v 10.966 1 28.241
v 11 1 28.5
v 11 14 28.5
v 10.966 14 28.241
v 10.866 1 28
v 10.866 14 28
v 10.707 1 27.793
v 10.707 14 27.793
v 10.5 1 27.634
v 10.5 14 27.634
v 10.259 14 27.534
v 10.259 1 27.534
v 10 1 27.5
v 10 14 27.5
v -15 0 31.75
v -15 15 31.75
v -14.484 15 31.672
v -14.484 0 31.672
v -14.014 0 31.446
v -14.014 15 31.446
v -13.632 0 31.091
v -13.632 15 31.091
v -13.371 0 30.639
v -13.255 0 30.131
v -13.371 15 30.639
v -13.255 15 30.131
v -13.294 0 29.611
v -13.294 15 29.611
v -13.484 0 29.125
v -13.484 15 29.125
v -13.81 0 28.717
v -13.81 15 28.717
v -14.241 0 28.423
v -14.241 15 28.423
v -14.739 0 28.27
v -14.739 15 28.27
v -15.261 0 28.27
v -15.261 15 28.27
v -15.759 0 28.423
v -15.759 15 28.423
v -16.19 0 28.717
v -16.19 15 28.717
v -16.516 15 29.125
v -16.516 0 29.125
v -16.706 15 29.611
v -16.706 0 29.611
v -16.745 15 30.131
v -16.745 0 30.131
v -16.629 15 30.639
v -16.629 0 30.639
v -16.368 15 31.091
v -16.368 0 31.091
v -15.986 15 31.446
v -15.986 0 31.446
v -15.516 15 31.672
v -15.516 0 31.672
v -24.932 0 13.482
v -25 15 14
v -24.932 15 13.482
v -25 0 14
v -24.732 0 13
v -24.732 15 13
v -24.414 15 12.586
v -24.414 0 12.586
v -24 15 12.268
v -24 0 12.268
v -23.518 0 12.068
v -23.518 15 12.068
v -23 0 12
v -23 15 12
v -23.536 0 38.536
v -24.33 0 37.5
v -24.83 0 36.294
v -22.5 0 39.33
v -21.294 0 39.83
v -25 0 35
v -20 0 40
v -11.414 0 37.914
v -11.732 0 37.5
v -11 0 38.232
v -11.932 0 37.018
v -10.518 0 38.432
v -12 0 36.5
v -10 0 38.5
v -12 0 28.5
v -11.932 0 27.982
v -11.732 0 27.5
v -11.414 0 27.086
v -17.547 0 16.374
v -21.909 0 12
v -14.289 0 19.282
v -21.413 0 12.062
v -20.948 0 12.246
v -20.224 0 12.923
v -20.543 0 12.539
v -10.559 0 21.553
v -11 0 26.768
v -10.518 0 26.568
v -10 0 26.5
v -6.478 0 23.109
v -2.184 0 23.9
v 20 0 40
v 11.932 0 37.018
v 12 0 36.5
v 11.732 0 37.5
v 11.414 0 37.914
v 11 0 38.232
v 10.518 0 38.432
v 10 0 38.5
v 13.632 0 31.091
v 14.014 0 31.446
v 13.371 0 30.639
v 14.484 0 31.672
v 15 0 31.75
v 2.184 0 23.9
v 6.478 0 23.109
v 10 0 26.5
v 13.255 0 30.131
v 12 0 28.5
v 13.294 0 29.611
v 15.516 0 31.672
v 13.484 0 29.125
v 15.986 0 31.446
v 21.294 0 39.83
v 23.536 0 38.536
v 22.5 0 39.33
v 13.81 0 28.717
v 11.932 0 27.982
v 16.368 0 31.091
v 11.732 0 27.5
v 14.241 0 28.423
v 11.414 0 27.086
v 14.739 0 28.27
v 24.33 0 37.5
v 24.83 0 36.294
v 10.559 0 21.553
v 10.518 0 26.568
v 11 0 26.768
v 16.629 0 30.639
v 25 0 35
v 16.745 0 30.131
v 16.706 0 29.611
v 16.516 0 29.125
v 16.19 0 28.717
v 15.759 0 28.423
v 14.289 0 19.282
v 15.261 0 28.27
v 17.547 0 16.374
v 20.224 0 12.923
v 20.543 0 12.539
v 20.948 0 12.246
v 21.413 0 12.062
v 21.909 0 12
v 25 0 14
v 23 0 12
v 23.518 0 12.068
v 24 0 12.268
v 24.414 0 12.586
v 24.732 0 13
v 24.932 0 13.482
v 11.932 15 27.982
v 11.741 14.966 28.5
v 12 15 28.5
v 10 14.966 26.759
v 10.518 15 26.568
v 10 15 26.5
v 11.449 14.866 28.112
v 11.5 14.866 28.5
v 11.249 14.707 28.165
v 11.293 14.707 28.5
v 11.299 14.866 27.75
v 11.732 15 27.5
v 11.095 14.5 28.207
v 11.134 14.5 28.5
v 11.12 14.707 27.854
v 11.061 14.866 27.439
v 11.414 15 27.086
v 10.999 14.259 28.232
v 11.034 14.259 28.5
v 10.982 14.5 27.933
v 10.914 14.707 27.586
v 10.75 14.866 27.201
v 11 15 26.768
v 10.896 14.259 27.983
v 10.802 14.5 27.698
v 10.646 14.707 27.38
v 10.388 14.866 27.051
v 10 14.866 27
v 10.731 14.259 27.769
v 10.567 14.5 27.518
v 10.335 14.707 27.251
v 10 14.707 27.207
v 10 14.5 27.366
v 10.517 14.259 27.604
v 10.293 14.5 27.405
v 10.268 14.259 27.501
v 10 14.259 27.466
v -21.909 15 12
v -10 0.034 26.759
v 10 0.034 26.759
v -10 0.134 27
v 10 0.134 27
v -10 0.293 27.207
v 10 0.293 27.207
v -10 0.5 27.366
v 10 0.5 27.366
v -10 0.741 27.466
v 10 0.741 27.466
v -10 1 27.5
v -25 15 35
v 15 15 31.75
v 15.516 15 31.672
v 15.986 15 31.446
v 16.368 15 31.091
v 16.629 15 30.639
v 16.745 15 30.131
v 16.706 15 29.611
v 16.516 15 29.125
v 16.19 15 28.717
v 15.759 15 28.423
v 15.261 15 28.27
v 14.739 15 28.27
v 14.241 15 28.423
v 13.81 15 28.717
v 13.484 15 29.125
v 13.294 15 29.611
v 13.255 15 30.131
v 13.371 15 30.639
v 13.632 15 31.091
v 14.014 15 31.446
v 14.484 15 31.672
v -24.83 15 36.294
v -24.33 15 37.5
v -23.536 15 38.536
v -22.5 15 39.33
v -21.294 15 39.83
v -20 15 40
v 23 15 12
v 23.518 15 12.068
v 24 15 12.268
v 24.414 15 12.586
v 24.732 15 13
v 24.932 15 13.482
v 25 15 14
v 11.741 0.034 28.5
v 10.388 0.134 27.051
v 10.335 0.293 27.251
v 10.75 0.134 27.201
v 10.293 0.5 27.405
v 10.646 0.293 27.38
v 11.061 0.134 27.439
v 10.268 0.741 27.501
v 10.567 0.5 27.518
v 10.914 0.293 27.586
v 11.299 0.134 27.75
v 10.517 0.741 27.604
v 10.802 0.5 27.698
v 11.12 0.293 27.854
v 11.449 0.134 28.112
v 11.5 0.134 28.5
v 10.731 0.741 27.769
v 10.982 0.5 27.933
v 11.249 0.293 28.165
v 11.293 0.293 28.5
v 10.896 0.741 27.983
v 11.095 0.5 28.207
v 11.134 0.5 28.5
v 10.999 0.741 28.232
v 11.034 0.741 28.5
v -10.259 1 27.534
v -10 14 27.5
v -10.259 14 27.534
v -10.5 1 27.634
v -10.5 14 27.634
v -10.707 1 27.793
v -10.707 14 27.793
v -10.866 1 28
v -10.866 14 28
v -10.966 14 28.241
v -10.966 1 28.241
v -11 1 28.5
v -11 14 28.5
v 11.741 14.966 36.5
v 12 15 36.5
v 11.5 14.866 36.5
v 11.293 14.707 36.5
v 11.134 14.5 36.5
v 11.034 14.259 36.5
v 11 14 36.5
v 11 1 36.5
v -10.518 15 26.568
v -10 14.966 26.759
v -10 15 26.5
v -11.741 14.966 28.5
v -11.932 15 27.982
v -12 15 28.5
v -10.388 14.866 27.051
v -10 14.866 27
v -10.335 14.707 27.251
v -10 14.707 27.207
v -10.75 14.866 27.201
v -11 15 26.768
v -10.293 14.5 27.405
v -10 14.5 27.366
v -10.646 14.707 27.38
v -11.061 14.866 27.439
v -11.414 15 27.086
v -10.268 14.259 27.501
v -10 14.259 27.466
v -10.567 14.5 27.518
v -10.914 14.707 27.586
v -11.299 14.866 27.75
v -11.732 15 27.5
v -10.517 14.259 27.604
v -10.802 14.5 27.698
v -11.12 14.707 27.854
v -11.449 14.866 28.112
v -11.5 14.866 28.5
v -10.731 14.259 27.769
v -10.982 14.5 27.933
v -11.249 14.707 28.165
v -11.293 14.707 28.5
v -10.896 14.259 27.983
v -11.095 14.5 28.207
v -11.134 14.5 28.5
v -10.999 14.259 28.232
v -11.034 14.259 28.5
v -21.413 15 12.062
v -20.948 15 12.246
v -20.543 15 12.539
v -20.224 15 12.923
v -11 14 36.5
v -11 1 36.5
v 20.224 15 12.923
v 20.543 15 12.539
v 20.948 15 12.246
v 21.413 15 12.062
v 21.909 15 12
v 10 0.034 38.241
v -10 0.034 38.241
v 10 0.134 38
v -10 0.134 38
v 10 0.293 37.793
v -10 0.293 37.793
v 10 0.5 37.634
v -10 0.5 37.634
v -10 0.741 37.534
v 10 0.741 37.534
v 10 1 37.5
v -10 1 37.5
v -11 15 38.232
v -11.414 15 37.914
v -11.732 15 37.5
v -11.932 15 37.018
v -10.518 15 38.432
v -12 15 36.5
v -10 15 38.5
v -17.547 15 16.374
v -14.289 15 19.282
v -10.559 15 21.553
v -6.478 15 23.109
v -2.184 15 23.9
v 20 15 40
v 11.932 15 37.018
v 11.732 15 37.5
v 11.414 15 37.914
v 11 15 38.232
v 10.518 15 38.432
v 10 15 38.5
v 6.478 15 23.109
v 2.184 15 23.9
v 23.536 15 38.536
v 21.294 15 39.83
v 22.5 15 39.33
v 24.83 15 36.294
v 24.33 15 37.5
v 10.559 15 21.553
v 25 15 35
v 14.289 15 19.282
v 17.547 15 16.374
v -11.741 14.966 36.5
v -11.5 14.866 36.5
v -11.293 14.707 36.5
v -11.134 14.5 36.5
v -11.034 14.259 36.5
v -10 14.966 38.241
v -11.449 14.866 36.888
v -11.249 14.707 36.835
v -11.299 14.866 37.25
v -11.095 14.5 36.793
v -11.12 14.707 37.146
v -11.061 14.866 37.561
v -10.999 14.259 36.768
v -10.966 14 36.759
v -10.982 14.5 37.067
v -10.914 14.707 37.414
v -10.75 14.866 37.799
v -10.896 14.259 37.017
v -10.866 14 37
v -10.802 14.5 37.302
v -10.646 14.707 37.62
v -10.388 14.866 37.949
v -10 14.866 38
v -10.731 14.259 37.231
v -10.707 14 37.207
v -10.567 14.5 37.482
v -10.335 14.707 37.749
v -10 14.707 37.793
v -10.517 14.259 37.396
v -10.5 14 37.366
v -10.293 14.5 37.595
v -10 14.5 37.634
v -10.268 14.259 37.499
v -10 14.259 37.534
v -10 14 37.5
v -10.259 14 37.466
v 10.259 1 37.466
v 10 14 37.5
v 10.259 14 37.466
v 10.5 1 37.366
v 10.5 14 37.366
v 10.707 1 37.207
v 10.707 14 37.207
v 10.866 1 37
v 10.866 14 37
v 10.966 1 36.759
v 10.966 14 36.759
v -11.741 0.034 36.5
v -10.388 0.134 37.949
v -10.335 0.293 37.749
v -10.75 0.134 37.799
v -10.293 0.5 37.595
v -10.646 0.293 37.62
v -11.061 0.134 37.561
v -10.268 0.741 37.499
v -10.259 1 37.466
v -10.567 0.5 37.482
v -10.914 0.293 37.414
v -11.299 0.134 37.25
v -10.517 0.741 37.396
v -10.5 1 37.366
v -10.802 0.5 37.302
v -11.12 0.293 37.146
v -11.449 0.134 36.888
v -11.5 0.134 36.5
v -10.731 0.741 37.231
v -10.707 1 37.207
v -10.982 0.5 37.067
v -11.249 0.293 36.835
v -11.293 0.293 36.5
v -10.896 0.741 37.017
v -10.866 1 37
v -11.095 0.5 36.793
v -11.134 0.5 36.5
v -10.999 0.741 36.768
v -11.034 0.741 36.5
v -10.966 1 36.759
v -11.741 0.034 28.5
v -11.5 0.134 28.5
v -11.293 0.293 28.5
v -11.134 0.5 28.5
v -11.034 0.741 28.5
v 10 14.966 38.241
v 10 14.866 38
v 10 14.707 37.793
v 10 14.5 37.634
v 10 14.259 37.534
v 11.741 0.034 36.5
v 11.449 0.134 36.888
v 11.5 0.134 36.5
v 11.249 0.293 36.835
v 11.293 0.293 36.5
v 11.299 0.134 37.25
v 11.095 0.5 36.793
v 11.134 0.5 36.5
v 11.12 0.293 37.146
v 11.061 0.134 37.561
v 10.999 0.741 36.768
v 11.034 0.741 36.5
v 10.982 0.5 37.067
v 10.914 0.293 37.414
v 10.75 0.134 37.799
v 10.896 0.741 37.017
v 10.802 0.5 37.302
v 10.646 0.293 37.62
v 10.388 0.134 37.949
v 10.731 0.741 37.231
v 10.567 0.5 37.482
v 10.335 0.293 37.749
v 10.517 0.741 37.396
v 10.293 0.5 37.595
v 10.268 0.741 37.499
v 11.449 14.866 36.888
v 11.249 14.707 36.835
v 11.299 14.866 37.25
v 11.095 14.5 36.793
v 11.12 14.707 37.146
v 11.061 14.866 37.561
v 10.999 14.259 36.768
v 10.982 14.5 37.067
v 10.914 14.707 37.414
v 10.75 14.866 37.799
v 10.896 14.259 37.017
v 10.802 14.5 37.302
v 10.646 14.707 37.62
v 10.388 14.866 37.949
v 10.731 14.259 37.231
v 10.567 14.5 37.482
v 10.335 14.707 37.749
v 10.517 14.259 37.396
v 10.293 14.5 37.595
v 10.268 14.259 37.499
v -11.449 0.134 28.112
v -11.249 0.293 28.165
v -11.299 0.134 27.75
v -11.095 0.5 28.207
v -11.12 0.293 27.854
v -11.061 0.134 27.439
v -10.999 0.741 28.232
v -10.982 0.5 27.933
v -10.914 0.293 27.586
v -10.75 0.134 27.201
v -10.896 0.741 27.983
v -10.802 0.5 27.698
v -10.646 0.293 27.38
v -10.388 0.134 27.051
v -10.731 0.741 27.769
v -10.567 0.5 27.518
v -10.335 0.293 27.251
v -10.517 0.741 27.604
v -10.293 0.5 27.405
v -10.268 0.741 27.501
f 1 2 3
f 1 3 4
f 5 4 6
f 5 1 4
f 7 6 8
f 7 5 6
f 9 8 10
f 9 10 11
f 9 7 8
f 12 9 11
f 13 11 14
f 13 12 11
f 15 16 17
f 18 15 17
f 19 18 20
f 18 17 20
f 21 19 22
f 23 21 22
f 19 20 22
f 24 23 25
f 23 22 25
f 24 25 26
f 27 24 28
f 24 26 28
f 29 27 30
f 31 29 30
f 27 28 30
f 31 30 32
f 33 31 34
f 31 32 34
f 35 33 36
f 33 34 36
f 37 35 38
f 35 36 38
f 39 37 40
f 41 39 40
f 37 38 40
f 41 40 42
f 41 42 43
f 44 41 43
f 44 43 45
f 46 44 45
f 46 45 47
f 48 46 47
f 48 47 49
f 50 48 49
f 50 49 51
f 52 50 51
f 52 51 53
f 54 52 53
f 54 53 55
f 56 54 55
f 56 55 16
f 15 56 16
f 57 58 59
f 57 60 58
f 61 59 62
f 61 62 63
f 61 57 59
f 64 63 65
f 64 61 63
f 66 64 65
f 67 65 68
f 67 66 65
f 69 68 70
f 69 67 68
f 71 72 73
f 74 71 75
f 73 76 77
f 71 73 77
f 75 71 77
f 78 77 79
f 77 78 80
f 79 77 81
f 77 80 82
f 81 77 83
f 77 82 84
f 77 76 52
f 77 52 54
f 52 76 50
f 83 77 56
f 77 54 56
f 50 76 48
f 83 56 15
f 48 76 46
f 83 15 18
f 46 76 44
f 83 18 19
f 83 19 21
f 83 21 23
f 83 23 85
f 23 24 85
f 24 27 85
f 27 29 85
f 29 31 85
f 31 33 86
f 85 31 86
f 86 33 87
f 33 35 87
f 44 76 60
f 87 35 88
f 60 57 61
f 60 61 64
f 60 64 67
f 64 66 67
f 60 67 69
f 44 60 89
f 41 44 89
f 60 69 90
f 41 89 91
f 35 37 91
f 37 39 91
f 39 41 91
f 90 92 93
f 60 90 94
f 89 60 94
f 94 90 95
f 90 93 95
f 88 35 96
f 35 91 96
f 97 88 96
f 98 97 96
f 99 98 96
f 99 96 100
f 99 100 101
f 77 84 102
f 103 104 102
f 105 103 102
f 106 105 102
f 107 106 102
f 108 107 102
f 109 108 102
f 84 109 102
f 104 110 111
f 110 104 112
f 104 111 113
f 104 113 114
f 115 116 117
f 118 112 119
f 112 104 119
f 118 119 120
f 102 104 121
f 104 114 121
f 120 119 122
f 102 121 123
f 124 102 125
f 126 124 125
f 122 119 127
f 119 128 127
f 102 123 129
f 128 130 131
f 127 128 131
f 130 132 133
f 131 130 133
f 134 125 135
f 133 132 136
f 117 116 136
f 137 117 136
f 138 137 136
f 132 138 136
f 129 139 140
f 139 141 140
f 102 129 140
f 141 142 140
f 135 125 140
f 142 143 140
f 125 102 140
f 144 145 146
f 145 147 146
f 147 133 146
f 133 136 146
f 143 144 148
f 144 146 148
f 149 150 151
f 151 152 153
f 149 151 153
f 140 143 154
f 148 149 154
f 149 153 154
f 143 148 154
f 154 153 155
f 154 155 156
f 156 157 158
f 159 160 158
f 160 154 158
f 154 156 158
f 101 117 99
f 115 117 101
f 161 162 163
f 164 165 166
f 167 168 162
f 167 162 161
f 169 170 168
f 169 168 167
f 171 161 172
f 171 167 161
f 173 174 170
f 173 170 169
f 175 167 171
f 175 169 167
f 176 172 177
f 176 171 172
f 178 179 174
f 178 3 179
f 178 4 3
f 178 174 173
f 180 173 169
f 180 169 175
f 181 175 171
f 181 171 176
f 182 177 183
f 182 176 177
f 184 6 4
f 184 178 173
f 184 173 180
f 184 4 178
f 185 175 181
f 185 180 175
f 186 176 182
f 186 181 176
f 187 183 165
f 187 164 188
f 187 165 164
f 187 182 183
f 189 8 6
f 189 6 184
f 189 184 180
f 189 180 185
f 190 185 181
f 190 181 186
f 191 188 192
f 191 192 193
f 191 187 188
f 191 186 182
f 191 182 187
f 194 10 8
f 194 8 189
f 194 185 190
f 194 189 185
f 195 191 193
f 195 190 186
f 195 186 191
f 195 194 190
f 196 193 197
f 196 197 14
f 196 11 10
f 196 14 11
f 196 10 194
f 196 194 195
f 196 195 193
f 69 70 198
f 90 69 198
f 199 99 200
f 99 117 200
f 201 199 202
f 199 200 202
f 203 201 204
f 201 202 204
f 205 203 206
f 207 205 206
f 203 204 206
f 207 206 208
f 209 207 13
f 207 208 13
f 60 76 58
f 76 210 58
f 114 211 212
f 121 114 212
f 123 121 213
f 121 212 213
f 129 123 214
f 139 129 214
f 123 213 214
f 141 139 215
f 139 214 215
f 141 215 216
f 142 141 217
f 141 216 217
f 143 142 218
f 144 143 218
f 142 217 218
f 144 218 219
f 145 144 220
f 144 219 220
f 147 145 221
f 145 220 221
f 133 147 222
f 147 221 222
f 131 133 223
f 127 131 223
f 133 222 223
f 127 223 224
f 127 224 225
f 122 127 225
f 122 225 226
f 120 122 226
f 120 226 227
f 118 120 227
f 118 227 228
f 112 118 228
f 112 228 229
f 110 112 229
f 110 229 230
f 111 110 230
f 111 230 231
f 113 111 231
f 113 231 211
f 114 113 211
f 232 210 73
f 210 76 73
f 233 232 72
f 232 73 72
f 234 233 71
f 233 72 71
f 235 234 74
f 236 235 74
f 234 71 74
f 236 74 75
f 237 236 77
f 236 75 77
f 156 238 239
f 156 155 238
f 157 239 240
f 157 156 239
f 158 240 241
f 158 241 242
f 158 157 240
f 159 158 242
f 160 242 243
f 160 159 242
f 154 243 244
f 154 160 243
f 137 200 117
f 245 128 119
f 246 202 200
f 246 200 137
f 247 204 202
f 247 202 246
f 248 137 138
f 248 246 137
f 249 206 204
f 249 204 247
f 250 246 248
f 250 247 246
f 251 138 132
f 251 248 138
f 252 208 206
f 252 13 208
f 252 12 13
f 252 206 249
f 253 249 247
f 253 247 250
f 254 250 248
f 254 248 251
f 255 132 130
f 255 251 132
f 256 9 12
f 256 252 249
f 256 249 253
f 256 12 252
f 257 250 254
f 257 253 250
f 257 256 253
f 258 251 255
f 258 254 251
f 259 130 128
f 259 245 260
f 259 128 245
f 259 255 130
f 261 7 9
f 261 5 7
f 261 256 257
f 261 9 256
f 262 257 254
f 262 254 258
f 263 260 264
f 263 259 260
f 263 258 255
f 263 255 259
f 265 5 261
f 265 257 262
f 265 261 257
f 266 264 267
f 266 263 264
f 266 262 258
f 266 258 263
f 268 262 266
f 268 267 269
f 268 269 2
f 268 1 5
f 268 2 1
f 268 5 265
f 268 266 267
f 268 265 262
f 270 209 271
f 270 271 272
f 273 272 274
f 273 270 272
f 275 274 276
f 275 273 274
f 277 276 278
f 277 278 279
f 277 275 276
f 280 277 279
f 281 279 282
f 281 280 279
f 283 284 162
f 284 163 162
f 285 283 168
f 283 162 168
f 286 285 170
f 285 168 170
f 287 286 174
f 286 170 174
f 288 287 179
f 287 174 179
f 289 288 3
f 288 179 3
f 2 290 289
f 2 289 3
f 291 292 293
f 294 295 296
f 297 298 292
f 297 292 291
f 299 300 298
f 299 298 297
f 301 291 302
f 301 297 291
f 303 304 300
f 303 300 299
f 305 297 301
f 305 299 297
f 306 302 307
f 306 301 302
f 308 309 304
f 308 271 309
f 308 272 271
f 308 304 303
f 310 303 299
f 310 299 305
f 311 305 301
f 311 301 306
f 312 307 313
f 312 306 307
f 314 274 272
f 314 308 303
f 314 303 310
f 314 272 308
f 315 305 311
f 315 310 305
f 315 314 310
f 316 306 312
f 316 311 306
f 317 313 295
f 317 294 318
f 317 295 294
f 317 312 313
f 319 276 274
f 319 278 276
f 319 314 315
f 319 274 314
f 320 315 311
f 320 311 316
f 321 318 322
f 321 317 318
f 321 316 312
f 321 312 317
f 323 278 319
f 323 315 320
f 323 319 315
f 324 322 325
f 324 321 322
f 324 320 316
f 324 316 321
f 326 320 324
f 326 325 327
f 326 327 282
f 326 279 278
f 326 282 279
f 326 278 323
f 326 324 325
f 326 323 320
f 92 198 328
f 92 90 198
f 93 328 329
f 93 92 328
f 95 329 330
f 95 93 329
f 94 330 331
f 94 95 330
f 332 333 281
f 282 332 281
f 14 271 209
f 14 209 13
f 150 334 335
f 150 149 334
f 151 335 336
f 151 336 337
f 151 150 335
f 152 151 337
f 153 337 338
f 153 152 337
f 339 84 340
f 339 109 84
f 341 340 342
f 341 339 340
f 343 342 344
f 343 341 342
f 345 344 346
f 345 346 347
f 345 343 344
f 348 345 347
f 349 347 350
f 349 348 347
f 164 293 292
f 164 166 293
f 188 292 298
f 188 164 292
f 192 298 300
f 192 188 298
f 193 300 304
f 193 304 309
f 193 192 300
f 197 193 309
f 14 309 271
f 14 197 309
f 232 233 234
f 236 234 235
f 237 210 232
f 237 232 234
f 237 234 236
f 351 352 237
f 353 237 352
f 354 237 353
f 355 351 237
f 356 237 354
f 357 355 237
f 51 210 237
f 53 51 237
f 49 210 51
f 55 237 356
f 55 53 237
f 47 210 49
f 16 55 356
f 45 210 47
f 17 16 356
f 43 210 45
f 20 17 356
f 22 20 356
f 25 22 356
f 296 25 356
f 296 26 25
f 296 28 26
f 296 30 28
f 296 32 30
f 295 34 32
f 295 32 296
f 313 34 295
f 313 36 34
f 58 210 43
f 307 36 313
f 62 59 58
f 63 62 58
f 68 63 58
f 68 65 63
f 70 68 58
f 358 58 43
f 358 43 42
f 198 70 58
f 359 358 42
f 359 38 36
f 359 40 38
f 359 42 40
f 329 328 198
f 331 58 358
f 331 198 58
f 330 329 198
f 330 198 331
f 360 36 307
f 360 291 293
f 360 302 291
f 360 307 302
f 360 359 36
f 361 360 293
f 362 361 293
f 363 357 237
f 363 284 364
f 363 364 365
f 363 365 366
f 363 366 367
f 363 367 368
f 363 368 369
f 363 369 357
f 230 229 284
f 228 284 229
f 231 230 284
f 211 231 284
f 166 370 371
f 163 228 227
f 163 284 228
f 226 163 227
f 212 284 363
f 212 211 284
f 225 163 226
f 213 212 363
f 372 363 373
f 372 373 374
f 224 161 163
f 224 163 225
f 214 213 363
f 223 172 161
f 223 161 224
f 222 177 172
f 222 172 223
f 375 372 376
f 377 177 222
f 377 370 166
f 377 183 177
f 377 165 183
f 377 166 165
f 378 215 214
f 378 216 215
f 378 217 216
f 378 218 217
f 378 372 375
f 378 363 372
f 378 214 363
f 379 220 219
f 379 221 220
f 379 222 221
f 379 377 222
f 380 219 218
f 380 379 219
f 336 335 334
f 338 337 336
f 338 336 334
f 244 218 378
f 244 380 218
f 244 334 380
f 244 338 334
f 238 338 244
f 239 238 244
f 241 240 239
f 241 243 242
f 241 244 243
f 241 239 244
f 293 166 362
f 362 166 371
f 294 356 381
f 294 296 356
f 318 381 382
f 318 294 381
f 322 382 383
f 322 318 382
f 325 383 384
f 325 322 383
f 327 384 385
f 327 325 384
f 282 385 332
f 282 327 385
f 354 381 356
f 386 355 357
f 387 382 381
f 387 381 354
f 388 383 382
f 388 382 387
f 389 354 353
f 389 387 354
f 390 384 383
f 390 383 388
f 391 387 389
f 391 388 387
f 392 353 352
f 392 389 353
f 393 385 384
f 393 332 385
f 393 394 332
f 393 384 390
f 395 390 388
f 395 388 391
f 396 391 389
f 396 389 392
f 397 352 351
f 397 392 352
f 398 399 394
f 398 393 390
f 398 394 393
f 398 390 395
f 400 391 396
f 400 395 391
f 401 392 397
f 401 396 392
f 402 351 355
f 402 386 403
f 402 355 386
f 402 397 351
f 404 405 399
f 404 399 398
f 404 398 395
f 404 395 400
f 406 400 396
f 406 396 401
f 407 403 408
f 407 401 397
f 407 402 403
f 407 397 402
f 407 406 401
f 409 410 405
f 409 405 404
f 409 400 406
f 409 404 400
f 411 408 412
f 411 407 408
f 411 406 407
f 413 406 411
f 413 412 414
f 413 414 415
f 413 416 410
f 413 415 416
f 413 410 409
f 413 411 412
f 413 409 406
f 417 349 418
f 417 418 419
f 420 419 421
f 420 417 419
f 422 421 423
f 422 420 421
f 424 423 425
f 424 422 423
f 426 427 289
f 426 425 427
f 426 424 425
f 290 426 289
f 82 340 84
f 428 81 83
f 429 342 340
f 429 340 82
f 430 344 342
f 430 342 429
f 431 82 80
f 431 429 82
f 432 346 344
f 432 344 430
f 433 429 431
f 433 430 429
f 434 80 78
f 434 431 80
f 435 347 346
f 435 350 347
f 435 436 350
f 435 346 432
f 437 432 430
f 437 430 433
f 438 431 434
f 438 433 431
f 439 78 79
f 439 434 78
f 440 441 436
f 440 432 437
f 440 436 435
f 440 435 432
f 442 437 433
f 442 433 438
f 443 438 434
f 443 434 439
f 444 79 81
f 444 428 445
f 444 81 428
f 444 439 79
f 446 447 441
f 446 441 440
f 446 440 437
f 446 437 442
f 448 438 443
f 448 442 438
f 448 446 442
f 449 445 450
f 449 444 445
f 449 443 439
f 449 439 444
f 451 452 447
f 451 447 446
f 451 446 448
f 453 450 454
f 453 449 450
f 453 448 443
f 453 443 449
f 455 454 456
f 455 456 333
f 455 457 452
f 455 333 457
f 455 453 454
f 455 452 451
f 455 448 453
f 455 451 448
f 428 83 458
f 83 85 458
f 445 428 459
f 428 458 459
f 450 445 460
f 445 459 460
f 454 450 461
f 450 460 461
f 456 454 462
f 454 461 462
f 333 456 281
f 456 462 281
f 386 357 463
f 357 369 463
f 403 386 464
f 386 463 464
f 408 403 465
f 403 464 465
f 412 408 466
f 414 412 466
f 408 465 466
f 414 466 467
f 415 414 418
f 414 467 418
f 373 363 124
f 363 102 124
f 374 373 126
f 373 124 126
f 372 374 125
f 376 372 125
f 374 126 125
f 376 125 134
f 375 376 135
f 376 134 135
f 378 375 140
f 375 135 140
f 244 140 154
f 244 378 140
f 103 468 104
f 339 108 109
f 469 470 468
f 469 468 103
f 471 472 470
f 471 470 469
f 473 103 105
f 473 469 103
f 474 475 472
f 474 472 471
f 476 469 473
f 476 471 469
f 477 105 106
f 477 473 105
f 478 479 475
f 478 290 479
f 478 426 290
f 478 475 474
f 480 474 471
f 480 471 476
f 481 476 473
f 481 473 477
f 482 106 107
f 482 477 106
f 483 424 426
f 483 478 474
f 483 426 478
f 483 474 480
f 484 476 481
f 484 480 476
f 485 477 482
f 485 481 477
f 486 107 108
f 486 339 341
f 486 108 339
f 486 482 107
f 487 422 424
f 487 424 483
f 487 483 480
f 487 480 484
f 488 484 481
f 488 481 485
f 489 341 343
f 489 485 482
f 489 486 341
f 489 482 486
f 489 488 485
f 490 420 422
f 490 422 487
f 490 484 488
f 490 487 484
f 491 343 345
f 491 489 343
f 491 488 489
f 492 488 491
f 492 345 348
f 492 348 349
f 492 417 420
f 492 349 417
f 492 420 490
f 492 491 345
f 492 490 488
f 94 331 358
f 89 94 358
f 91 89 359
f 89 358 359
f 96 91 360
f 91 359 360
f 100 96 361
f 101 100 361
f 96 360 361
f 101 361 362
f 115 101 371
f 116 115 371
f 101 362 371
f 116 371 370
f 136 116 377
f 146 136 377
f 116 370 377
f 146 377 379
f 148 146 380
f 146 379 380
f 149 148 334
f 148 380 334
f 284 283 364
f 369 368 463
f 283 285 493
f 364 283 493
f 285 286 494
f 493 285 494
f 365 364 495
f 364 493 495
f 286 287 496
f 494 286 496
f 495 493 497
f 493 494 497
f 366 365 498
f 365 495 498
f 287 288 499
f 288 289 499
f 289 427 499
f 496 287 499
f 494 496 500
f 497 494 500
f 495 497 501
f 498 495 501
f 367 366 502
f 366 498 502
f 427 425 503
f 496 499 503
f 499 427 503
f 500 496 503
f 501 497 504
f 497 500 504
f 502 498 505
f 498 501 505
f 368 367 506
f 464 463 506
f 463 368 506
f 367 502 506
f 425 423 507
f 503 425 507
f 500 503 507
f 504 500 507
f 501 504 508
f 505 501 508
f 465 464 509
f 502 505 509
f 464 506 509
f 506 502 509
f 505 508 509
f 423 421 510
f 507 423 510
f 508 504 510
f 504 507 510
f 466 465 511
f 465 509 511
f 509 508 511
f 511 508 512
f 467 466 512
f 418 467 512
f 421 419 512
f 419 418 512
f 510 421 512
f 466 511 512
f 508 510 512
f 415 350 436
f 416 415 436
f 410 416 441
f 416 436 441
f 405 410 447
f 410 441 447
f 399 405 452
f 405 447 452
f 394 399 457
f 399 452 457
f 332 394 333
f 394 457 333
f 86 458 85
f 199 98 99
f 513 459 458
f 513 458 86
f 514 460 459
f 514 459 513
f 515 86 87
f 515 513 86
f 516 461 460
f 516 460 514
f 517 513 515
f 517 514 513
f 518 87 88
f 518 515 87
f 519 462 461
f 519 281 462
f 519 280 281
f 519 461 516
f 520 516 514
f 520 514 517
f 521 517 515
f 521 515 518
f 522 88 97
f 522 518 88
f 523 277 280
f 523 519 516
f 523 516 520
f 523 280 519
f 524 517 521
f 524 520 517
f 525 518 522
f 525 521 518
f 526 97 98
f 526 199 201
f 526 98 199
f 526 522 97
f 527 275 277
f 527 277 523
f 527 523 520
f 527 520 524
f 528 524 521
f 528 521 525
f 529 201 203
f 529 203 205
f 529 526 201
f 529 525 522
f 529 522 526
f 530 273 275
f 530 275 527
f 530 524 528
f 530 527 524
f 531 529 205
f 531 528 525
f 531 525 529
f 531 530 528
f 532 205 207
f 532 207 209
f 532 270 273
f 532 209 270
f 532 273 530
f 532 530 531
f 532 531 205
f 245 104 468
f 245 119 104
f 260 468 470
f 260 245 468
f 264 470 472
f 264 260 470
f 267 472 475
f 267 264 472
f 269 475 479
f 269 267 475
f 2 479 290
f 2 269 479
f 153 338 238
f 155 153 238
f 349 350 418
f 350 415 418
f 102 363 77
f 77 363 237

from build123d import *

# Parameters (mm, degrees)
SKETCH_1_W          = 50
SKETCH_1_H          = 50
SKETCH_1_R          = 21.05
EXTRUDE_1_DEPTH     = 15
SKETCH_2_W          = 50
SKETCH_2_H          = 30
SKETCH_2_R          = 1.6
EXTRUDE_2_DEPTH     = 15
FILLET_1_R          = 3
SKETCH_3_R          = 1.75
CUT_EXTRUDE_1_DEPTH = 63.24949799
SKETCH_4_R          = 1.6
CUT_EXTRUDE_2_DEPTH = 63.24949799
FILLET_2_R          = 2
FILLET_3_R          = 5
SKETCH_5_W          = 22
SKETCH_5_H          = 10
CUT_EXTRUDE_3_DEPTH = 50.497474683
FILLET_4_R          = 1


with BuildPart() as part:
    # 草图1 → 凸台-拉伸1 (new body)
    with BuildSketch(Plane(origin=(0, 0, 0), x_dir=(1, 0, 0), z_dir=(0, 1, 0))):
        Rectangle(SKETCH_1_W, SKETCH_1_H)
        with Locations(Location((0, 0, 0), (0, 0, 270))):
            Circle(SKETCH_1_R, mode=Mode.SUBTRACT)
    extrude(amount=EXTRUDE_1_DEPTH)

    # 草图2 → 凸台-拉伸2 (add)
    with BuildSketch(Plane(origin=(0, 15, 0), x_dir=(1, 0, 0), z_dir=(0, 1, 0))):
        with Locations((0, -40)):
            Rectangle(SKETCH_2_W, SKETCH_2_H)
        with Locations(Location((-15, -47.5, 0), (0, 0, 270))):
            Circle(SKETCH_2_R, mode=Mode.SUBTRACT)
        with Locations(Location((15, -47.5, 0), (0, 0, 270))):
            Circle(SKETCH_2_R, mode=Mode.SUBTRACT)
    extrude(amount=-EXTRUDE_2_DEPTH)

    # 圆角1
    fillet_1_edges = [part.edges().sort_by_distance(p)[0] for p in [
        (25, 7.5, 55),
        (-25, 7.5, 55),
        (-25, 7.5, -25),
        (25, 7.5, -25),
    ]]
    fillet(fillet_1_edges, radius=FILLET_1_R)

    # 草图3 → 切除-拉伸1 (cut, through all)
    with BuildSketch(Plane(origin=(0, 15, 0), x_dir=(1, 0, 0), z_dir=(0, 1, 0))):
        with Locations(Location((-15, -30, 0), (0, 0, 270))):
            Circle(SKETCH_3_R)
        with Locations(Location((15, -30, 0), (0, 0, 270))):
            Circle(SKETCH_3_R)
    extrude(amount=-CUT_EXTRUDE_1_DEPTH, mode=Mode.SUBTRACT)

    # 草图4 → 切除-拉伸2 (cut, through all)
    # profile 1 of 6: a face of its own
    with BuildSketch(Plane(origin=(0, 15, 0), x_dir=(1, 0, 0), z_dir=(0, 1, 0))):
        with BuildLine():
            Line((25, -40), (-25, -40))
            Line((-25, -40), (-25, -52))
            ThreePointArc((-25, -52), (-24.121320344, -54.121320344), (-22, -55))
            Line((-22, -55), (22, -55))
            ThreePointArc((22, -55), (24.121320344, -54.121320344), (25, -52))
            Line((25, -52), (25, -40))
        make_face()
        with Locations((-15, -47.5)):
            Circle(SKETCH_4_R, mode=Mode.SUBTRACT)
        with Locations((15, -47.5)):
            Circle(SKETCH_4_R, mode=Mode.SUBTRACT)
    # profile 2 of 6: a face of its own
    with BuildSketch(Plane(origin=(0, 15, 0), x_dir=(1, 0, 0), z_dir=(0, 1, 0))):
        with BuildLine():
            Line((-25, 22), (-25, -12))
            Line((-25, -12), (-20.784609691, -12))
            ThreePointArc((-20.784609691, -12), (-6.211657082, 23.182219831), (24, 0))
            ThreePointArc((24, 0), (23.182219831, -6.211657082), (20.784609691, -12))
            Line((20.784609691, -12), (25, -12))
            Line((25, -12), (25, 22))
            ThreePointArc((25, 22), (24.121320344, 24.121320344), (22, 25))
            Line((22, 25), (-22, 25))
            ThreePointArc((-22, 25), (-24.121320344, 24.121320344), (-25, 22))
        make_face()
    # profile 3 of 6: a face of its own
    with BuildSketch(Plane(origin=(0, 15, 0), x_dir=(1, 0, 0), z_dir=(0, 1, 0))):
        with BuildLine():
            ThreePointArc((24, 0), (-6.211657082, 23.182219831), (-20.784609691, -12))
            Line((-20.784609691, -12), (-17.294580076, -12))
            ThreePointArc((-17.294580076, -12), (-6.286954326, 20.089218633), (21.05, 0))
            ThreePointArc((21.05, 0), (20.089218633, -6.286954326), (17.294580076, -12))
            Line((17.294580076, -12), (20.784609691, -12))
            ThreePointArc((20.784609691, -12), (23.182219831, -6.211657082), (24, 0))
        make_face()
    # profile 4 of 6: a face of its own
    with BuildSketch(Plane(origin=(0, 15, 0), x_dir=(1, 0, 0), z_dir=(0, 1, 0))):
        with BuildLine():
            Line((-17.294580076, -12), (-20.784609691, -12))
            ThreePointArc((-20.784609691, -12), (0, -24), (20.784609691, -12))
            Line((20.784609691, -12), (17.294580076, -12))
            ThreePointArc((17.294580076, -12), (0, -21.05), (-17.294580076, -12))
        make_face()
    # profile 5 of 6: a face of its own
    with BuildSketch(Plane(origin=(0, 15, 0), x_dir=(1, 0, 0), z_dir=(0, 1, 0))):
        with BuildLine():
            ThreePointArc((24, 0), (-6.211657082, 23.182219831), (-20.784609691, -12))
            Line((-20.784609691, -12), (-17.294580076, -12))
            ThreePointArc((-17.294580076, -12), (-6.286954326, 20.089218633), (21.05, 0))
            ThreePointArc((21.05, 0), (20.089218633, -6.286954326), (17.294580076, -12))
            Line((17.294580076, -12), (20.784609691, -12))
            ThreePointArc((20.784609691, -12), (23.182219831, -6.211657082), (24, 0))
        make_face()
    # profile 6 of 6: a face of its own
    with BuildSketch(Plane(origin=(0, 15, 0), x_dir=(1, 0, 0), z_dir=(0, 1, 0))):
        with BuildLine():
            Line((-17.294580076, -12), (-20.784609691, -12))
            ThreePointArc((-20.784609691, -12), (0, -24), (20.784609691, -12))
            Line((20.784609691, -12), (17.294580076, -12))
            ThreePointArc((17.294580076, -12), (0, -21.05), (-17.294580076, -12))
        make_face()
    extrude(amount=-CUT_EXTRUDE_2_DEPTH, mode=Mode.SUBTRACT)

    # 圆角2
    fillet_2_edges = [part.edges().sort_by_distance(p)[0] for p in [
        (20.784609691, 7.5, 12),
        (-20.784609691, 7.5, 12),
        (-25, 7.5, 12),
        (25, 7.5, 12),
    ]]
    fillet(fillet_2_edges, radius=FILLET_2_R)

    # 圆角3
    fillet_3_edges = [part.edges().sort_by_distance(p)[0] for p in [
        (-25, 7.5, 40),
        (25, 7.5, 40),
    ]]
    fillet(fillet_3_edges, radius=FILLET_3_R)

    # 草图5 → 切除-拉伸3 (cut, through all)
    with BuildSketch(Plane(origin=(0, 15, 0), x_dir=(1, 0, 0), z_dir=(0, 1, 0))):
        with Locations((0, -32.5)):
            Rectangle(SKETCH_5_W, SKETCH_5_H)
    extrude(amount=-CUT_EXTRUDE_3_DEPTH, mode=Mode.SUBTRACT)

    # 圆角4
    fillet_4_edges = [part.edges().sort_by_distance(p)[0] for p in [
        (11, 0, 32.5),
        (11, 7.5, 27.5),
        (0, 0, 37.5),
        (11, 7.5, 37.5),
        (-11, 0, 32.5),
        (-11, 7.5, 37.5),
        (0, 0, 27.5),
        (-11, 7.5, 27.5),
        (11, 15, 32.5),
        (0, 15, 27.5),
        (-11, 15, 32.5),
        (0, 15, 37.5),
    ]]
    fillet(fillet_4_edges, radius=FILLET_4_R)


solid = part.part
